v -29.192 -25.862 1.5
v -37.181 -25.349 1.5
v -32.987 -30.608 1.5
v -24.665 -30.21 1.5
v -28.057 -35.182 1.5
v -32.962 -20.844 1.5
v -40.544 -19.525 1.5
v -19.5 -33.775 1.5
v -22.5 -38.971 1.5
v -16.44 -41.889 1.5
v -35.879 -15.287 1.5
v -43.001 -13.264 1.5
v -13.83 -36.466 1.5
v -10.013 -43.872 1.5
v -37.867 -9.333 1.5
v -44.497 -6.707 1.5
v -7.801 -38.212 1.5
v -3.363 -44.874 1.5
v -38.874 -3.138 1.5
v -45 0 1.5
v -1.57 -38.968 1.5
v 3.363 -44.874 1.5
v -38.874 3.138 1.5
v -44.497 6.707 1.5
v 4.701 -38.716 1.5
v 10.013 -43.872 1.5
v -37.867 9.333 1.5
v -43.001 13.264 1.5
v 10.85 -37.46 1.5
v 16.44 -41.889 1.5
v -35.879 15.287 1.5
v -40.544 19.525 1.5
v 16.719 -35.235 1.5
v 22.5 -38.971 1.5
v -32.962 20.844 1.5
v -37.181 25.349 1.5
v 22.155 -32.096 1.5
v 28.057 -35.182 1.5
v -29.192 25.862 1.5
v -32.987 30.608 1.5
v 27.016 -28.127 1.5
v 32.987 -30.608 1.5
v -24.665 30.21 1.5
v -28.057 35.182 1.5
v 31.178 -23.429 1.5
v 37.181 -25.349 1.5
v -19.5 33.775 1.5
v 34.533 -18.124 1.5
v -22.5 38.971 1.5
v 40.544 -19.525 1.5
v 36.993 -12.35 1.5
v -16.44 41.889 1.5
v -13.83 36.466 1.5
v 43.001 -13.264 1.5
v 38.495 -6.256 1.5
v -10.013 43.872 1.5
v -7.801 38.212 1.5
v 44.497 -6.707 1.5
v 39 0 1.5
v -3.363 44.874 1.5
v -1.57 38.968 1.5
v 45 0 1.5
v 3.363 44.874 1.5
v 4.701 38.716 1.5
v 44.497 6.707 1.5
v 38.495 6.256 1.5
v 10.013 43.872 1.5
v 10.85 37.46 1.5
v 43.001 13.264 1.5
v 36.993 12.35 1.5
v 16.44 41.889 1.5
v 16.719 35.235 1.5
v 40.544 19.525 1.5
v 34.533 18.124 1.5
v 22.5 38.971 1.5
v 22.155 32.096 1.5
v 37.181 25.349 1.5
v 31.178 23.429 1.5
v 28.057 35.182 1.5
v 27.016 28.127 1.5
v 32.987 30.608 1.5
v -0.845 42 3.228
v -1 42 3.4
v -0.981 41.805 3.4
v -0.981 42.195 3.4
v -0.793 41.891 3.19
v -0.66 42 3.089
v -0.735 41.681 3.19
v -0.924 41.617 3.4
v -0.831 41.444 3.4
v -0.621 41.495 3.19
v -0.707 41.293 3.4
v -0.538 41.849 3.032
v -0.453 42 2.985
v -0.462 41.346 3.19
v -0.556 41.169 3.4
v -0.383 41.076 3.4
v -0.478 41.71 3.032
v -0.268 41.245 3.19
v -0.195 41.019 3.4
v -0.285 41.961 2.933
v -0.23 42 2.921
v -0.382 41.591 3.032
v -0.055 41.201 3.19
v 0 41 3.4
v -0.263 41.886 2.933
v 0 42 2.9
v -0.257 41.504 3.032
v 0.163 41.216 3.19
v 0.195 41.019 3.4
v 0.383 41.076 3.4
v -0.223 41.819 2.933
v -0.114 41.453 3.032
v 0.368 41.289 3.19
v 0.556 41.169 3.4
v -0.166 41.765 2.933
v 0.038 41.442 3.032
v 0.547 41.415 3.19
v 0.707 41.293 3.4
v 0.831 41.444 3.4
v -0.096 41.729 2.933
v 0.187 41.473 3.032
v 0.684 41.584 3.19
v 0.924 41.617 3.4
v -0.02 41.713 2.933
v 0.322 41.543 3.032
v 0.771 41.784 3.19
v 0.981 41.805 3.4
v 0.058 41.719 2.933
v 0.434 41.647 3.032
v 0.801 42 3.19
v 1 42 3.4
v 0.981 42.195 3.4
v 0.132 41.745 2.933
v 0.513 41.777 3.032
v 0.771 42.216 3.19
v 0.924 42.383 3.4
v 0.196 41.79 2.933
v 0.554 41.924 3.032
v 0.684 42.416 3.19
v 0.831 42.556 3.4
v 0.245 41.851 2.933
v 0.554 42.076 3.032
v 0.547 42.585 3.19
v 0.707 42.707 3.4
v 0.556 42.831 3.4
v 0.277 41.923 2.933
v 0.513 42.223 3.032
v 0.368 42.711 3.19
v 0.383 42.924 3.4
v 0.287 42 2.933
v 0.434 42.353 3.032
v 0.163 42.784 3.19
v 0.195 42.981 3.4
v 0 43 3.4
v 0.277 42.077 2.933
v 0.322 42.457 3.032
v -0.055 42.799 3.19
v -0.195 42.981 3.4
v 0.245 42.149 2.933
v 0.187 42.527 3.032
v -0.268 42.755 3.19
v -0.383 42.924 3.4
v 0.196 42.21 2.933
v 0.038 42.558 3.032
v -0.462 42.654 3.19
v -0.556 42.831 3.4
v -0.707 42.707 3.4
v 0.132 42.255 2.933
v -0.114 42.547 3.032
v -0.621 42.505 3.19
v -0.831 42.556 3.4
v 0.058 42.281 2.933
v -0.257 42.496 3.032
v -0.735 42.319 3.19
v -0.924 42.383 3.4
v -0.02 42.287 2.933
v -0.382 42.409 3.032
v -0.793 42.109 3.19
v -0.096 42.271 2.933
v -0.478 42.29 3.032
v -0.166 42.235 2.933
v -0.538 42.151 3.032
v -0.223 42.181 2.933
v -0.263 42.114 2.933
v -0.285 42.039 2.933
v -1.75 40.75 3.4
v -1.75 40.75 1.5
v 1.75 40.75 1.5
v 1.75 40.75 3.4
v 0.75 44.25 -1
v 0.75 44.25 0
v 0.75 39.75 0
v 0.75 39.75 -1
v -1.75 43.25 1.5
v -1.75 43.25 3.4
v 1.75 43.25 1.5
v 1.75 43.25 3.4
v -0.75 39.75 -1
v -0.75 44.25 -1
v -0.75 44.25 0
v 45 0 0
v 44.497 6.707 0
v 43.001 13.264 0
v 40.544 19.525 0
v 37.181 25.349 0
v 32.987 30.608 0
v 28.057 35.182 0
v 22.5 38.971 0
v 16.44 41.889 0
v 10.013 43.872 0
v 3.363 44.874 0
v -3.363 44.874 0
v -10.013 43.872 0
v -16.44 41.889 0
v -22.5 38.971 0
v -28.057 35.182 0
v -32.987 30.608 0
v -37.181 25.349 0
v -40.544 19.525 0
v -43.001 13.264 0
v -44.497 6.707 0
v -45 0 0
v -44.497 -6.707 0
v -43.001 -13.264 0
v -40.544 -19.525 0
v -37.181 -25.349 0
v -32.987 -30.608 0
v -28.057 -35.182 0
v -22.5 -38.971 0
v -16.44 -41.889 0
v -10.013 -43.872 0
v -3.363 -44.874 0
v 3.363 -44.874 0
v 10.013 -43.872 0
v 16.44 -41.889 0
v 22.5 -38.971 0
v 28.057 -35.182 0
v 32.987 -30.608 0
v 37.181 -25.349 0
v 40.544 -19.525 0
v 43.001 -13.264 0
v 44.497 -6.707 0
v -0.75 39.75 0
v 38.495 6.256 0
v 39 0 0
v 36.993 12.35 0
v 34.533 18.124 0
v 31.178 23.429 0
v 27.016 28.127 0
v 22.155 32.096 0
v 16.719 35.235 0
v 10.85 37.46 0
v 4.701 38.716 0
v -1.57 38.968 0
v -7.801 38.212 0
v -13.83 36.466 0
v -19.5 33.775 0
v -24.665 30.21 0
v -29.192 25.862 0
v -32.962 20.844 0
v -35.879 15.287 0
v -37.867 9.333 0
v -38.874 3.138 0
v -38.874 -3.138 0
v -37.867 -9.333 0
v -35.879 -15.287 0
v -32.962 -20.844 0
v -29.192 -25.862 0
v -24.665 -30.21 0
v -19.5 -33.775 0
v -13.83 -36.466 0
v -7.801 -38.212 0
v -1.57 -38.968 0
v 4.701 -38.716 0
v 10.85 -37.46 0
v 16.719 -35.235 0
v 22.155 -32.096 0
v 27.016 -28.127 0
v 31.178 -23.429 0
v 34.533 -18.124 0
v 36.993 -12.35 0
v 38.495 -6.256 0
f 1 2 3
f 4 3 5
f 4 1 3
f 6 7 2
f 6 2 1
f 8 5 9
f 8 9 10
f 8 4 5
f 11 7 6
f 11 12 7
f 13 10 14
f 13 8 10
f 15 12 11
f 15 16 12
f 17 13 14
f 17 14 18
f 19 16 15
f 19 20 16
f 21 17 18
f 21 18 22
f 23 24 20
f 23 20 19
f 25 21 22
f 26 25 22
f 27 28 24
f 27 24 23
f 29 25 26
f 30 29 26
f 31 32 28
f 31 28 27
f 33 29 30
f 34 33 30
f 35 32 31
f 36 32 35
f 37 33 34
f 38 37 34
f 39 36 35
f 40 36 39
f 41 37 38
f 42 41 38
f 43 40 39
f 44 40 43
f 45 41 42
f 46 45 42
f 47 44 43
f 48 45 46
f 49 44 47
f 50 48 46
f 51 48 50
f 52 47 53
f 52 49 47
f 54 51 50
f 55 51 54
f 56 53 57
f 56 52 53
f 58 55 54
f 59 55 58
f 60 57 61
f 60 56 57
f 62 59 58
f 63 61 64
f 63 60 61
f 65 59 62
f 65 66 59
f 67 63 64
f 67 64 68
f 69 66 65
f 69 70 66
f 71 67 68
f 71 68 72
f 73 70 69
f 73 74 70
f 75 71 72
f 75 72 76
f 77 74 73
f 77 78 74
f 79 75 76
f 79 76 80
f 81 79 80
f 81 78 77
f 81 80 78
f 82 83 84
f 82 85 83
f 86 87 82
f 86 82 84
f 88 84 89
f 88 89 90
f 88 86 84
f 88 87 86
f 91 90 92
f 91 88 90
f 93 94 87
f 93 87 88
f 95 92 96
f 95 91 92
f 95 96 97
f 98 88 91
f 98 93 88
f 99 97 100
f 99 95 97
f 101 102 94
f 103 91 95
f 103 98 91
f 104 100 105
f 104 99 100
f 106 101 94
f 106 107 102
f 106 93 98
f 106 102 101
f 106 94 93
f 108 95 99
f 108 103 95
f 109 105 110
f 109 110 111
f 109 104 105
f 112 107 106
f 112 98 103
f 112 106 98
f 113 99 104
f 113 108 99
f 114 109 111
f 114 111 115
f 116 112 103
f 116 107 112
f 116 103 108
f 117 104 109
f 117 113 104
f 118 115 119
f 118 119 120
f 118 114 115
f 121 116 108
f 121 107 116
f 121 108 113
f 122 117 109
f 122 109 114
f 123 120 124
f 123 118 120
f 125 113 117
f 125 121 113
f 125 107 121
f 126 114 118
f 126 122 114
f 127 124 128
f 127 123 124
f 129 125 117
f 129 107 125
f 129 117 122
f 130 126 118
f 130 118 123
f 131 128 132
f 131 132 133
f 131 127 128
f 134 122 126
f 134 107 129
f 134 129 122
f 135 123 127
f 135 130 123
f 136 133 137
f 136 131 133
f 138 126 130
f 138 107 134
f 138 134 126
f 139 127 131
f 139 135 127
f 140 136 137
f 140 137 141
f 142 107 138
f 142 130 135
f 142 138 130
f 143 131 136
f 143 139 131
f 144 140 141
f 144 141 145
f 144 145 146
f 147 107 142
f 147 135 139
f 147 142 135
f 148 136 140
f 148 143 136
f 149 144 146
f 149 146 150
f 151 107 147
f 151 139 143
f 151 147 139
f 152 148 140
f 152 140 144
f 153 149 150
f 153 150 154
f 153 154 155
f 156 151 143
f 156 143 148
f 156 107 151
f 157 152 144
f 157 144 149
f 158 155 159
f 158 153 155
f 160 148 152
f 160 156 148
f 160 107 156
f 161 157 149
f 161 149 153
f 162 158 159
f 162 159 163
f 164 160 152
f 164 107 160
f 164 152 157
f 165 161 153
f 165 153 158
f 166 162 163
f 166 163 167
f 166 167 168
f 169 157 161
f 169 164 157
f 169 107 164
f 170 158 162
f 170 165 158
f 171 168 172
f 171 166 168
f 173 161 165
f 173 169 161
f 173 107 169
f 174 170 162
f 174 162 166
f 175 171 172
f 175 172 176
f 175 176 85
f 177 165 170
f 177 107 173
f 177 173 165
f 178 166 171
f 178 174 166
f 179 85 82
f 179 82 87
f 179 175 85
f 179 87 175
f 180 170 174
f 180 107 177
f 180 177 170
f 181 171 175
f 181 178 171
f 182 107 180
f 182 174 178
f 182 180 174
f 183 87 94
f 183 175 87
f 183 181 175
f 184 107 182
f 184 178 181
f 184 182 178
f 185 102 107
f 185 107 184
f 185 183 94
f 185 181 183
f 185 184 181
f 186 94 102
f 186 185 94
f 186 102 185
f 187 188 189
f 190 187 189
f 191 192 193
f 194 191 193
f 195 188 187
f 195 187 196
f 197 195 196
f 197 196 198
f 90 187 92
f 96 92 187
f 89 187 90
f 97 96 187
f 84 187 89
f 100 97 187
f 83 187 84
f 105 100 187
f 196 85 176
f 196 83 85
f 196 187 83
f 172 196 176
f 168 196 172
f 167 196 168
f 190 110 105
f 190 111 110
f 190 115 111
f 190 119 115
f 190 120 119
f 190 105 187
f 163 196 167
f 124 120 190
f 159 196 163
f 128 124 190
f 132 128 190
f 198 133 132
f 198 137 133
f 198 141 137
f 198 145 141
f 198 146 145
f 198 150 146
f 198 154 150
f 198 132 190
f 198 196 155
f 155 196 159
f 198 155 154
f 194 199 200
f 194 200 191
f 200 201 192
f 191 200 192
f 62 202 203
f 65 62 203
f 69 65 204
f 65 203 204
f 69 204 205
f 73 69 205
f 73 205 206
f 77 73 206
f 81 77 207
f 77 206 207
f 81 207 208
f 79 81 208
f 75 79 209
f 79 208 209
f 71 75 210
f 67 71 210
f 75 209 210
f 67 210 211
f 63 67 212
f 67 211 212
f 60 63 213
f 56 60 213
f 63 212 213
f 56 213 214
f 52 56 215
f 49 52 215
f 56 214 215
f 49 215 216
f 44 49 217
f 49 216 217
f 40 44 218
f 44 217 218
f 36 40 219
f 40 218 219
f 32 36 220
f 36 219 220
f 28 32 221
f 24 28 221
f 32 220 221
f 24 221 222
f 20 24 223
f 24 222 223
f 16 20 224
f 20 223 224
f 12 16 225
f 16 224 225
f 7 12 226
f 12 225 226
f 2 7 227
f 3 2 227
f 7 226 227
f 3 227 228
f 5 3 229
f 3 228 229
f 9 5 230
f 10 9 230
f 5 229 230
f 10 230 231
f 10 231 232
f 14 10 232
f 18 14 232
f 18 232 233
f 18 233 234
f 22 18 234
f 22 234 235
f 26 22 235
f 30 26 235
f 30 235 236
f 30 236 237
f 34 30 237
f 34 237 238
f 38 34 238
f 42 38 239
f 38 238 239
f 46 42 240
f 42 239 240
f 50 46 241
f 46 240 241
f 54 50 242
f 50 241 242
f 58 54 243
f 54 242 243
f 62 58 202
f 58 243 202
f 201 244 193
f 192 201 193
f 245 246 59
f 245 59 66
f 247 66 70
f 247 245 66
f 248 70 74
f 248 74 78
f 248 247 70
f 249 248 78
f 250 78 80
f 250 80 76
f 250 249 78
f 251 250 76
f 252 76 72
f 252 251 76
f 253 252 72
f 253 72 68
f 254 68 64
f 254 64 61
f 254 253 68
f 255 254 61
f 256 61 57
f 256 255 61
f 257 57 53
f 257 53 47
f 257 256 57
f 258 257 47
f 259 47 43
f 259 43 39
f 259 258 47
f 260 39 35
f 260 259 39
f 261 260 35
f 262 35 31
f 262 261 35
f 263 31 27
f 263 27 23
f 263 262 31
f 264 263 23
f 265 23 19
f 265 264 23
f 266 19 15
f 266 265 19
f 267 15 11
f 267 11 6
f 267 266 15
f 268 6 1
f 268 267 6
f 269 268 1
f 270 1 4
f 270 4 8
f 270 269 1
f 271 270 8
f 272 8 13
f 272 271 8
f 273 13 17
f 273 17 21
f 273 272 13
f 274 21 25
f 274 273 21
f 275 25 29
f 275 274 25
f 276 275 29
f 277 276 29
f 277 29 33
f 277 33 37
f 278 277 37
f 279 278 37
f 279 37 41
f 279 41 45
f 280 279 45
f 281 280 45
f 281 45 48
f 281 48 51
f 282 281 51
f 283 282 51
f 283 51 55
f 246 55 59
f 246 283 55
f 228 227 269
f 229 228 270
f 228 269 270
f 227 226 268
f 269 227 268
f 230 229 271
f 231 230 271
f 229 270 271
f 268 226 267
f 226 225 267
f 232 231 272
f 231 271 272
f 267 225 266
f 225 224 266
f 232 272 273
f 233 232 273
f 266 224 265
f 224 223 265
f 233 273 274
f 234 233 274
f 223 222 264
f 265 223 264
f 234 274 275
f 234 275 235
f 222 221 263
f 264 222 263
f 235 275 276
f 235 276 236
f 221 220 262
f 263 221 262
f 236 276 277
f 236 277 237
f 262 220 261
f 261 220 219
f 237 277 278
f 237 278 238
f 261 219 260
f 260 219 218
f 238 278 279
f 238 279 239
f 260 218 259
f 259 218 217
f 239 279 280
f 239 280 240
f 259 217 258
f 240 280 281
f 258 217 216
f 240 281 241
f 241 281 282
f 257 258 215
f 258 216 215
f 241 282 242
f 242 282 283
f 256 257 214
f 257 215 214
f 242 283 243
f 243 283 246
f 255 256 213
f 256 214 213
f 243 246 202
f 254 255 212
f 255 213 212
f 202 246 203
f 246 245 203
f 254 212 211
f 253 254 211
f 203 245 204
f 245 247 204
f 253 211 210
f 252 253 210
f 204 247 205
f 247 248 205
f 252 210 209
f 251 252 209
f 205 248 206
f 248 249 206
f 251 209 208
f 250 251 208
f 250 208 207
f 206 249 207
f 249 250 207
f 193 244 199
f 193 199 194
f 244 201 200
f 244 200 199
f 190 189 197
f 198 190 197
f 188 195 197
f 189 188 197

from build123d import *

# Parameters (mm, degrees)
F0_R     = 45
F0_R_2   = 39
F1_DEPTH = 1.5
F2_W     = 3.5
F2_H     = 2.5
F3_DEPTH = 1.9
F8_W     = 1.5
F8_H     = 4.5
F9_DEPTH = 1


with BuildPart() as f1:
    # F0 (on Top) → F1 (new body)
    with BuildSketch(Plane.XY):
        Circle(F0_R)
        Circle(F0_R_2, mode=Mode.SUBTRACT)
    extrude(amount=F1_DEPTH)


with BuildPart() as f3:
    # F2 (on face) → F3 (new body)
    with BuildSketch(Plane.XY.offset(1.5)):
        with Locations((0, 42)):
            Rectangle(F2_W, F2_H)
    extrude(amount=F3_DEPTH)

    # F6 (on plane+point) → F7 (revolve, cut)
    with BuildSketch(Plane.XZ.offset(-42)):
        with BuildLine():
            Line((0, 3.4), (-1, 3.4))
            ThreePointArc((-1, 3.4), (-0.5590169944, 3.0319660113), (0, 2.9))
            Line((0, 2.9), (0, 3.4))
        make_face()
    revolve(axis=Axis((0, 42, 3.15), (0, 0, 1)), mode=Mode.SUBTRACT)


with BuildPart() as f9:
    # F8 (on face) → F9 (new body)
    with BuildSketch(Plane(origin=(0, 0, 0), x_dir=(1, 0, 0), z_dir=(0, 0, -1))):
        with Locations((0, -42)):
            Rectangle(F8_W, F8_H)
    extrude(amount=F9_DEPTH)


solid = Compound([f1.part, f3.part, f9.part])
